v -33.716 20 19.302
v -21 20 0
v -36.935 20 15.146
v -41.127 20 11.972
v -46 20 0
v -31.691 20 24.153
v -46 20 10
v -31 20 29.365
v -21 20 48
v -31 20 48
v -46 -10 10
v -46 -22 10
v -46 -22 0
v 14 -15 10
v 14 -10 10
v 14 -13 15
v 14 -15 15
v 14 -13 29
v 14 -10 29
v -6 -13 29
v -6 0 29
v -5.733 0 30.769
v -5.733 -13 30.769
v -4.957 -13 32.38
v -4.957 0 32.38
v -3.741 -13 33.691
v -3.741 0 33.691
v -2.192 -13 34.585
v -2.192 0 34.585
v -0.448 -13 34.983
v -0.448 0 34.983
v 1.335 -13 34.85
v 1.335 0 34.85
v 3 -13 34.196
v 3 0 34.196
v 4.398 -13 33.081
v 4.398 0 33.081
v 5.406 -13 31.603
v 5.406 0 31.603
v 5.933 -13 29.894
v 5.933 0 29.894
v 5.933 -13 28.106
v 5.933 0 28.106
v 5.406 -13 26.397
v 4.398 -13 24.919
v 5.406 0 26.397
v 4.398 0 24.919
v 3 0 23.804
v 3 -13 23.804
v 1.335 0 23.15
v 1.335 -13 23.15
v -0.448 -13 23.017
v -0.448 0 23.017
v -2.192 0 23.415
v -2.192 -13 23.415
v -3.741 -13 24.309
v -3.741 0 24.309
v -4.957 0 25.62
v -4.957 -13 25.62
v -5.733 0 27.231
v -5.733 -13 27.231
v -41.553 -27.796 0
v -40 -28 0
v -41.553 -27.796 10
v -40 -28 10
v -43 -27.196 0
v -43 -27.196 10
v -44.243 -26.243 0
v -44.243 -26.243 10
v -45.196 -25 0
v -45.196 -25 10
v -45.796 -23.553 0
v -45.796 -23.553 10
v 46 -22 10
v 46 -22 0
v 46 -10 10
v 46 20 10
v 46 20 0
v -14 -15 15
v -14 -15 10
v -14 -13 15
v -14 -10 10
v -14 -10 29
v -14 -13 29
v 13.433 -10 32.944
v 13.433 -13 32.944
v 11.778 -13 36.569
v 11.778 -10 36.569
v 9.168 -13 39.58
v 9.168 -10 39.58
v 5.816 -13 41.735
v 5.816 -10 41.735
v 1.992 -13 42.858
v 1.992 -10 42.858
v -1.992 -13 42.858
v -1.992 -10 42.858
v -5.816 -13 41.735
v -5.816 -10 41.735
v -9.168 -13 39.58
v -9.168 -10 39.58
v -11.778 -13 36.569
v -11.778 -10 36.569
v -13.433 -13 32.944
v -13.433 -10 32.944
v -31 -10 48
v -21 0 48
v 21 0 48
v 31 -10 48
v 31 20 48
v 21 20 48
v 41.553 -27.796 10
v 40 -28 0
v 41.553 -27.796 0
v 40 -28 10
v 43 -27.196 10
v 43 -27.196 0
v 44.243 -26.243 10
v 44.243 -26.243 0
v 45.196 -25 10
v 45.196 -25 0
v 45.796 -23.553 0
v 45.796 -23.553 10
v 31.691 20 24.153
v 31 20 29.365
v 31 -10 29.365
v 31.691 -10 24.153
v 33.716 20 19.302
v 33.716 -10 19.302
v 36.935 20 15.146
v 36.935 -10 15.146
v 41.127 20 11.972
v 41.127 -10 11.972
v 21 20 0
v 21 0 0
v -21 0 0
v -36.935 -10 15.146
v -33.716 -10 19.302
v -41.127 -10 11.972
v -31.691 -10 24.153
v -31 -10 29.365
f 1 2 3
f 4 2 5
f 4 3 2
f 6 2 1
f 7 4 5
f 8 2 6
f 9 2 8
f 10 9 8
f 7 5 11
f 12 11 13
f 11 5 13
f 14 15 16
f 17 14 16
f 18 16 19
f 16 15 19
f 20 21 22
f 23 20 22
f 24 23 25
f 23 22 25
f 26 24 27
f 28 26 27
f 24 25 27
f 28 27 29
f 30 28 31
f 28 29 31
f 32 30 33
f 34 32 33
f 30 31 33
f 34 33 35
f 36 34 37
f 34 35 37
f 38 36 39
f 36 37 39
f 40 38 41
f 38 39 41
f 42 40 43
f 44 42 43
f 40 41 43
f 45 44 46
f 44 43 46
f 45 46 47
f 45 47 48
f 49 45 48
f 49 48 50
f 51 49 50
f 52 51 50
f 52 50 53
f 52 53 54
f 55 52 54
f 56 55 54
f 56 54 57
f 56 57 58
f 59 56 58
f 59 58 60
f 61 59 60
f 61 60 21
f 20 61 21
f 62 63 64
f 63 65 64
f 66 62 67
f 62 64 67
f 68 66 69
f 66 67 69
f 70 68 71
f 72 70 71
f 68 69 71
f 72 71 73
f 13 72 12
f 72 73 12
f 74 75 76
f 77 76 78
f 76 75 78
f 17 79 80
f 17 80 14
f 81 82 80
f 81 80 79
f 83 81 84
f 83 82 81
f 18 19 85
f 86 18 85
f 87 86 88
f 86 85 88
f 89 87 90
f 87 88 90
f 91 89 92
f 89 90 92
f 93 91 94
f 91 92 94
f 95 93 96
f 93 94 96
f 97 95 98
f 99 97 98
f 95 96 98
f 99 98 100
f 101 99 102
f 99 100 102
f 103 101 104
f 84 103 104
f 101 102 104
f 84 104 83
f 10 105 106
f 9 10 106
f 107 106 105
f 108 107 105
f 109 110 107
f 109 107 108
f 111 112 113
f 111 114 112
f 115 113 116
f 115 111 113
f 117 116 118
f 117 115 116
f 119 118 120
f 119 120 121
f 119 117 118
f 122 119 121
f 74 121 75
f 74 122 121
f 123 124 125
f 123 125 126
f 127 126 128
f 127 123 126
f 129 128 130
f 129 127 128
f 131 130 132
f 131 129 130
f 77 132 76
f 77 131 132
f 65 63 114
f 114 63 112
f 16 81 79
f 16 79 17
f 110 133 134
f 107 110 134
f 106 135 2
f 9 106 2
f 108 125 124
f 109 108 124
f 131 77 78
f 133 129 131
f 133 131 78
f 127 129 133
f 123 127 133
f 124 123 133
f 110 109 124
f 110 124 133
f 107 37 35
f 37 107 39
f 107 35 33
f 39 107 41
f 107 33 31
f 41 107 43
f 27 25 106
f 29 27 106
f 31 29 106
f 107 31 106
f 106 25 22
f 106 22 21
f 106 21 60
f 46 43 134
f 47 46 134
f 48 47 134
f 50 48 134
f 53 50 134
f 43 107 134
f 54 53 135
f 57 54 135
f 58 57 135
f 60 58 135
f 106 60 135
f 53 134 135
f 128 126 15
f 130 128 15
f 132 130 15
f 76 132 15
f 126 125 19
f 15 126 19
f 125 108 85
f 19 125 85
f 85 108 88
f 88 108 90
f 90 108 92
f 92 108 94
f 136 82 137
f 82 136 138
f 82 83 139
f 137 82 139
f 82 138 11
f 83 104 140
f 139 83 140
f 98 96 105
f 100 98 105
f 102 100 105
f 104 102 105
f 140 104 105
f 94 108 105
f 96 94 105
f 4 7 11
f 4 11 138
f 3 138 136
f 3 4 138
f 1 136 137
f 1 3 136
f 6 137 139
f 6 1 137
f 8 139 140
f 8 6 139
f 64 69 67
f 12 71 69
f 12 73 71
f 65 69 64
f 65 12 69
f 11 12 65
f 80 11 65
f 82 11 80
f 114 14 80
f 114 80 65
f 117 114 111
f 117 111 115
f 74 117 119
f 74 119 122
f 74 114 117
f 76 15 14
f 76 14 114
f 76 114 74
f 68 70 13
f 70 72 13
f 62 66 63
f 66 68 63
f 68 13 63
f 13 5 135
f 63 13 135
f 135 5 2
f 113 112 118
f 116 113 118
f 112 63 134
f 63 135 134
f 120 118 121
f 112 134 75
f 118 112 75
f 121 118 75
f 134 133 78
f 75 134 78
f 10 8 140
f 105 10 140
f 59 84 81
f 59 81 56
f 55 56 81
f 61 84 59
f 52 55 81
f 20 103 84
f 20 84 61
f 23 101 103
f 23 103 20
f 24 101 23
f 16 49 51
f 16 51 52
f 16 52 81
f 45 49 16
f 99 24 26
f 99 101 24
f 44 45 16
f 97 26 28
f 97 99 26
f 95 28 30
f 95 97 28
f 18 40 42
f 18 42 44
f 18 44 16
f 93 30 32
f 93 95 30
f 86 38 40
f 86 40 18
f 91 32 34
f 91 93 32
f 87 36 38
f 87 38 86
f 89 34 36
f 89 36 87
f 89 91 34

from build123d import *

# Parameters (mm, degrees)
F1_DEPTH    = 48
F2_DEPTH    = 10
F3_T1_DEPTH = 30
F4_T1_DEPTH = 30
F6_DEPTH    = 3
F5_W        = 28
F5_H        = 5
F7_DEPTH    = 5
F8_R        = 6
F9_R        = 6
F11_D       = 12


# Not quite as in the source:
# - a fillet or chamfer that OpenCascade refuses, or shapes differently, is made with other operations: its cross-section is extruded or revolved along the edge and cut away or added


with BuildPart() as f1:
    # F0 (on Top) → F1 (new body)
    with BuildSketch(Plane.XY):
        Polygon((-21, 20), (-31, 20), (-31, -10), (31, -10), (31, 20), (21, 20), (21, 0), (-21, 0), align=None)
    extrude(amount=F1_DEPTH)

    # F0 (on Top) → F2 (join)
    with BuildSketch(Plane.XY):
        Polygon((-31, 20), (-46, 20), (-46, -28), (46, -28), (46, 20), (31, 20), (31, -10), (-31, -10), align=None)
        Polygon((-21, 20), (-31, 20), (-31, -10), (31, -10), (31, 20), (21, 20), (21, 0), (-21, 0), align=None)
    extrude(amount=F2_DEPTH)

    # F3: fillet of radius 20 on 1 edges, made by hand

    # F3_s2 → F3_t1 (join)
    with BuildSketch(Plane.XZ.offset(-20)):
        with BuildLine():
            ThreePointArc((31, 29.364916731), (35.1886116992, 17.1174680171), (46, 10))
            Line((46, 10), (31, 10))
            Line((31, 10), (31, 29.364916731))
        make_face()
    extrude(amount=F3_T1_DEPTH)

    # F4: fillet of radius 20 on 1 edges, made by hand

    # F4_s2 → F4_t1 (join)
    with BuildSketch(Plane.XZ.offset(-20)):
        with BuildLine():
            ThreePointArc((-46, 10), (-35.1886116992, 17.1174680171), (-31, 29.364916731))
            Line((-31, 29.364916731), (-31, 10))
            Line((-31, 10), (-46, 10))
        make_face()
    extrude(amount=F4_T1_DEPTH)

    # F5 (on face) → F6 (join)
    with BuildSketch(Plane.XZ.offset(10)):
        with BuildLine():
            Line((-14, 29), (-14, 15))
            Line((-14, 15), (14, 15))
            Line((14, 15), (14, 29))
            ThreePointArc((14, 29), (0, 43), (-14, 29))
        make_face()
    extrude(amount=F6_DEPTH)

    # F5 (on face) → F7 (join)
    with BuildSketch(Plane.XZ.offset(10)):
        with Locations((0, 12.5)):
            Rectangle(F5_W, F5_H)
    extrude(amount=F7_DEPTH)

    # F8
    f8_edges = [f1.edges().sort_by_distance(p)[0] for p in [
        (46, -28, 5),
    ]]
    fillet(f8_edges, radius=F8_R)

    # F9
    f9_edges = [f1.edges().sort_by_distance(p)[0] for p in [
        (-46, -28, 5),
    ]]
    fillet(f9_edges, radius=F9_R)

    # F11 (through all)
    with Locations(Plane.XZ.offset(13)):
        with Locations((0, 29)):
            Hole(F11_D / 2)


solid = f1.part
